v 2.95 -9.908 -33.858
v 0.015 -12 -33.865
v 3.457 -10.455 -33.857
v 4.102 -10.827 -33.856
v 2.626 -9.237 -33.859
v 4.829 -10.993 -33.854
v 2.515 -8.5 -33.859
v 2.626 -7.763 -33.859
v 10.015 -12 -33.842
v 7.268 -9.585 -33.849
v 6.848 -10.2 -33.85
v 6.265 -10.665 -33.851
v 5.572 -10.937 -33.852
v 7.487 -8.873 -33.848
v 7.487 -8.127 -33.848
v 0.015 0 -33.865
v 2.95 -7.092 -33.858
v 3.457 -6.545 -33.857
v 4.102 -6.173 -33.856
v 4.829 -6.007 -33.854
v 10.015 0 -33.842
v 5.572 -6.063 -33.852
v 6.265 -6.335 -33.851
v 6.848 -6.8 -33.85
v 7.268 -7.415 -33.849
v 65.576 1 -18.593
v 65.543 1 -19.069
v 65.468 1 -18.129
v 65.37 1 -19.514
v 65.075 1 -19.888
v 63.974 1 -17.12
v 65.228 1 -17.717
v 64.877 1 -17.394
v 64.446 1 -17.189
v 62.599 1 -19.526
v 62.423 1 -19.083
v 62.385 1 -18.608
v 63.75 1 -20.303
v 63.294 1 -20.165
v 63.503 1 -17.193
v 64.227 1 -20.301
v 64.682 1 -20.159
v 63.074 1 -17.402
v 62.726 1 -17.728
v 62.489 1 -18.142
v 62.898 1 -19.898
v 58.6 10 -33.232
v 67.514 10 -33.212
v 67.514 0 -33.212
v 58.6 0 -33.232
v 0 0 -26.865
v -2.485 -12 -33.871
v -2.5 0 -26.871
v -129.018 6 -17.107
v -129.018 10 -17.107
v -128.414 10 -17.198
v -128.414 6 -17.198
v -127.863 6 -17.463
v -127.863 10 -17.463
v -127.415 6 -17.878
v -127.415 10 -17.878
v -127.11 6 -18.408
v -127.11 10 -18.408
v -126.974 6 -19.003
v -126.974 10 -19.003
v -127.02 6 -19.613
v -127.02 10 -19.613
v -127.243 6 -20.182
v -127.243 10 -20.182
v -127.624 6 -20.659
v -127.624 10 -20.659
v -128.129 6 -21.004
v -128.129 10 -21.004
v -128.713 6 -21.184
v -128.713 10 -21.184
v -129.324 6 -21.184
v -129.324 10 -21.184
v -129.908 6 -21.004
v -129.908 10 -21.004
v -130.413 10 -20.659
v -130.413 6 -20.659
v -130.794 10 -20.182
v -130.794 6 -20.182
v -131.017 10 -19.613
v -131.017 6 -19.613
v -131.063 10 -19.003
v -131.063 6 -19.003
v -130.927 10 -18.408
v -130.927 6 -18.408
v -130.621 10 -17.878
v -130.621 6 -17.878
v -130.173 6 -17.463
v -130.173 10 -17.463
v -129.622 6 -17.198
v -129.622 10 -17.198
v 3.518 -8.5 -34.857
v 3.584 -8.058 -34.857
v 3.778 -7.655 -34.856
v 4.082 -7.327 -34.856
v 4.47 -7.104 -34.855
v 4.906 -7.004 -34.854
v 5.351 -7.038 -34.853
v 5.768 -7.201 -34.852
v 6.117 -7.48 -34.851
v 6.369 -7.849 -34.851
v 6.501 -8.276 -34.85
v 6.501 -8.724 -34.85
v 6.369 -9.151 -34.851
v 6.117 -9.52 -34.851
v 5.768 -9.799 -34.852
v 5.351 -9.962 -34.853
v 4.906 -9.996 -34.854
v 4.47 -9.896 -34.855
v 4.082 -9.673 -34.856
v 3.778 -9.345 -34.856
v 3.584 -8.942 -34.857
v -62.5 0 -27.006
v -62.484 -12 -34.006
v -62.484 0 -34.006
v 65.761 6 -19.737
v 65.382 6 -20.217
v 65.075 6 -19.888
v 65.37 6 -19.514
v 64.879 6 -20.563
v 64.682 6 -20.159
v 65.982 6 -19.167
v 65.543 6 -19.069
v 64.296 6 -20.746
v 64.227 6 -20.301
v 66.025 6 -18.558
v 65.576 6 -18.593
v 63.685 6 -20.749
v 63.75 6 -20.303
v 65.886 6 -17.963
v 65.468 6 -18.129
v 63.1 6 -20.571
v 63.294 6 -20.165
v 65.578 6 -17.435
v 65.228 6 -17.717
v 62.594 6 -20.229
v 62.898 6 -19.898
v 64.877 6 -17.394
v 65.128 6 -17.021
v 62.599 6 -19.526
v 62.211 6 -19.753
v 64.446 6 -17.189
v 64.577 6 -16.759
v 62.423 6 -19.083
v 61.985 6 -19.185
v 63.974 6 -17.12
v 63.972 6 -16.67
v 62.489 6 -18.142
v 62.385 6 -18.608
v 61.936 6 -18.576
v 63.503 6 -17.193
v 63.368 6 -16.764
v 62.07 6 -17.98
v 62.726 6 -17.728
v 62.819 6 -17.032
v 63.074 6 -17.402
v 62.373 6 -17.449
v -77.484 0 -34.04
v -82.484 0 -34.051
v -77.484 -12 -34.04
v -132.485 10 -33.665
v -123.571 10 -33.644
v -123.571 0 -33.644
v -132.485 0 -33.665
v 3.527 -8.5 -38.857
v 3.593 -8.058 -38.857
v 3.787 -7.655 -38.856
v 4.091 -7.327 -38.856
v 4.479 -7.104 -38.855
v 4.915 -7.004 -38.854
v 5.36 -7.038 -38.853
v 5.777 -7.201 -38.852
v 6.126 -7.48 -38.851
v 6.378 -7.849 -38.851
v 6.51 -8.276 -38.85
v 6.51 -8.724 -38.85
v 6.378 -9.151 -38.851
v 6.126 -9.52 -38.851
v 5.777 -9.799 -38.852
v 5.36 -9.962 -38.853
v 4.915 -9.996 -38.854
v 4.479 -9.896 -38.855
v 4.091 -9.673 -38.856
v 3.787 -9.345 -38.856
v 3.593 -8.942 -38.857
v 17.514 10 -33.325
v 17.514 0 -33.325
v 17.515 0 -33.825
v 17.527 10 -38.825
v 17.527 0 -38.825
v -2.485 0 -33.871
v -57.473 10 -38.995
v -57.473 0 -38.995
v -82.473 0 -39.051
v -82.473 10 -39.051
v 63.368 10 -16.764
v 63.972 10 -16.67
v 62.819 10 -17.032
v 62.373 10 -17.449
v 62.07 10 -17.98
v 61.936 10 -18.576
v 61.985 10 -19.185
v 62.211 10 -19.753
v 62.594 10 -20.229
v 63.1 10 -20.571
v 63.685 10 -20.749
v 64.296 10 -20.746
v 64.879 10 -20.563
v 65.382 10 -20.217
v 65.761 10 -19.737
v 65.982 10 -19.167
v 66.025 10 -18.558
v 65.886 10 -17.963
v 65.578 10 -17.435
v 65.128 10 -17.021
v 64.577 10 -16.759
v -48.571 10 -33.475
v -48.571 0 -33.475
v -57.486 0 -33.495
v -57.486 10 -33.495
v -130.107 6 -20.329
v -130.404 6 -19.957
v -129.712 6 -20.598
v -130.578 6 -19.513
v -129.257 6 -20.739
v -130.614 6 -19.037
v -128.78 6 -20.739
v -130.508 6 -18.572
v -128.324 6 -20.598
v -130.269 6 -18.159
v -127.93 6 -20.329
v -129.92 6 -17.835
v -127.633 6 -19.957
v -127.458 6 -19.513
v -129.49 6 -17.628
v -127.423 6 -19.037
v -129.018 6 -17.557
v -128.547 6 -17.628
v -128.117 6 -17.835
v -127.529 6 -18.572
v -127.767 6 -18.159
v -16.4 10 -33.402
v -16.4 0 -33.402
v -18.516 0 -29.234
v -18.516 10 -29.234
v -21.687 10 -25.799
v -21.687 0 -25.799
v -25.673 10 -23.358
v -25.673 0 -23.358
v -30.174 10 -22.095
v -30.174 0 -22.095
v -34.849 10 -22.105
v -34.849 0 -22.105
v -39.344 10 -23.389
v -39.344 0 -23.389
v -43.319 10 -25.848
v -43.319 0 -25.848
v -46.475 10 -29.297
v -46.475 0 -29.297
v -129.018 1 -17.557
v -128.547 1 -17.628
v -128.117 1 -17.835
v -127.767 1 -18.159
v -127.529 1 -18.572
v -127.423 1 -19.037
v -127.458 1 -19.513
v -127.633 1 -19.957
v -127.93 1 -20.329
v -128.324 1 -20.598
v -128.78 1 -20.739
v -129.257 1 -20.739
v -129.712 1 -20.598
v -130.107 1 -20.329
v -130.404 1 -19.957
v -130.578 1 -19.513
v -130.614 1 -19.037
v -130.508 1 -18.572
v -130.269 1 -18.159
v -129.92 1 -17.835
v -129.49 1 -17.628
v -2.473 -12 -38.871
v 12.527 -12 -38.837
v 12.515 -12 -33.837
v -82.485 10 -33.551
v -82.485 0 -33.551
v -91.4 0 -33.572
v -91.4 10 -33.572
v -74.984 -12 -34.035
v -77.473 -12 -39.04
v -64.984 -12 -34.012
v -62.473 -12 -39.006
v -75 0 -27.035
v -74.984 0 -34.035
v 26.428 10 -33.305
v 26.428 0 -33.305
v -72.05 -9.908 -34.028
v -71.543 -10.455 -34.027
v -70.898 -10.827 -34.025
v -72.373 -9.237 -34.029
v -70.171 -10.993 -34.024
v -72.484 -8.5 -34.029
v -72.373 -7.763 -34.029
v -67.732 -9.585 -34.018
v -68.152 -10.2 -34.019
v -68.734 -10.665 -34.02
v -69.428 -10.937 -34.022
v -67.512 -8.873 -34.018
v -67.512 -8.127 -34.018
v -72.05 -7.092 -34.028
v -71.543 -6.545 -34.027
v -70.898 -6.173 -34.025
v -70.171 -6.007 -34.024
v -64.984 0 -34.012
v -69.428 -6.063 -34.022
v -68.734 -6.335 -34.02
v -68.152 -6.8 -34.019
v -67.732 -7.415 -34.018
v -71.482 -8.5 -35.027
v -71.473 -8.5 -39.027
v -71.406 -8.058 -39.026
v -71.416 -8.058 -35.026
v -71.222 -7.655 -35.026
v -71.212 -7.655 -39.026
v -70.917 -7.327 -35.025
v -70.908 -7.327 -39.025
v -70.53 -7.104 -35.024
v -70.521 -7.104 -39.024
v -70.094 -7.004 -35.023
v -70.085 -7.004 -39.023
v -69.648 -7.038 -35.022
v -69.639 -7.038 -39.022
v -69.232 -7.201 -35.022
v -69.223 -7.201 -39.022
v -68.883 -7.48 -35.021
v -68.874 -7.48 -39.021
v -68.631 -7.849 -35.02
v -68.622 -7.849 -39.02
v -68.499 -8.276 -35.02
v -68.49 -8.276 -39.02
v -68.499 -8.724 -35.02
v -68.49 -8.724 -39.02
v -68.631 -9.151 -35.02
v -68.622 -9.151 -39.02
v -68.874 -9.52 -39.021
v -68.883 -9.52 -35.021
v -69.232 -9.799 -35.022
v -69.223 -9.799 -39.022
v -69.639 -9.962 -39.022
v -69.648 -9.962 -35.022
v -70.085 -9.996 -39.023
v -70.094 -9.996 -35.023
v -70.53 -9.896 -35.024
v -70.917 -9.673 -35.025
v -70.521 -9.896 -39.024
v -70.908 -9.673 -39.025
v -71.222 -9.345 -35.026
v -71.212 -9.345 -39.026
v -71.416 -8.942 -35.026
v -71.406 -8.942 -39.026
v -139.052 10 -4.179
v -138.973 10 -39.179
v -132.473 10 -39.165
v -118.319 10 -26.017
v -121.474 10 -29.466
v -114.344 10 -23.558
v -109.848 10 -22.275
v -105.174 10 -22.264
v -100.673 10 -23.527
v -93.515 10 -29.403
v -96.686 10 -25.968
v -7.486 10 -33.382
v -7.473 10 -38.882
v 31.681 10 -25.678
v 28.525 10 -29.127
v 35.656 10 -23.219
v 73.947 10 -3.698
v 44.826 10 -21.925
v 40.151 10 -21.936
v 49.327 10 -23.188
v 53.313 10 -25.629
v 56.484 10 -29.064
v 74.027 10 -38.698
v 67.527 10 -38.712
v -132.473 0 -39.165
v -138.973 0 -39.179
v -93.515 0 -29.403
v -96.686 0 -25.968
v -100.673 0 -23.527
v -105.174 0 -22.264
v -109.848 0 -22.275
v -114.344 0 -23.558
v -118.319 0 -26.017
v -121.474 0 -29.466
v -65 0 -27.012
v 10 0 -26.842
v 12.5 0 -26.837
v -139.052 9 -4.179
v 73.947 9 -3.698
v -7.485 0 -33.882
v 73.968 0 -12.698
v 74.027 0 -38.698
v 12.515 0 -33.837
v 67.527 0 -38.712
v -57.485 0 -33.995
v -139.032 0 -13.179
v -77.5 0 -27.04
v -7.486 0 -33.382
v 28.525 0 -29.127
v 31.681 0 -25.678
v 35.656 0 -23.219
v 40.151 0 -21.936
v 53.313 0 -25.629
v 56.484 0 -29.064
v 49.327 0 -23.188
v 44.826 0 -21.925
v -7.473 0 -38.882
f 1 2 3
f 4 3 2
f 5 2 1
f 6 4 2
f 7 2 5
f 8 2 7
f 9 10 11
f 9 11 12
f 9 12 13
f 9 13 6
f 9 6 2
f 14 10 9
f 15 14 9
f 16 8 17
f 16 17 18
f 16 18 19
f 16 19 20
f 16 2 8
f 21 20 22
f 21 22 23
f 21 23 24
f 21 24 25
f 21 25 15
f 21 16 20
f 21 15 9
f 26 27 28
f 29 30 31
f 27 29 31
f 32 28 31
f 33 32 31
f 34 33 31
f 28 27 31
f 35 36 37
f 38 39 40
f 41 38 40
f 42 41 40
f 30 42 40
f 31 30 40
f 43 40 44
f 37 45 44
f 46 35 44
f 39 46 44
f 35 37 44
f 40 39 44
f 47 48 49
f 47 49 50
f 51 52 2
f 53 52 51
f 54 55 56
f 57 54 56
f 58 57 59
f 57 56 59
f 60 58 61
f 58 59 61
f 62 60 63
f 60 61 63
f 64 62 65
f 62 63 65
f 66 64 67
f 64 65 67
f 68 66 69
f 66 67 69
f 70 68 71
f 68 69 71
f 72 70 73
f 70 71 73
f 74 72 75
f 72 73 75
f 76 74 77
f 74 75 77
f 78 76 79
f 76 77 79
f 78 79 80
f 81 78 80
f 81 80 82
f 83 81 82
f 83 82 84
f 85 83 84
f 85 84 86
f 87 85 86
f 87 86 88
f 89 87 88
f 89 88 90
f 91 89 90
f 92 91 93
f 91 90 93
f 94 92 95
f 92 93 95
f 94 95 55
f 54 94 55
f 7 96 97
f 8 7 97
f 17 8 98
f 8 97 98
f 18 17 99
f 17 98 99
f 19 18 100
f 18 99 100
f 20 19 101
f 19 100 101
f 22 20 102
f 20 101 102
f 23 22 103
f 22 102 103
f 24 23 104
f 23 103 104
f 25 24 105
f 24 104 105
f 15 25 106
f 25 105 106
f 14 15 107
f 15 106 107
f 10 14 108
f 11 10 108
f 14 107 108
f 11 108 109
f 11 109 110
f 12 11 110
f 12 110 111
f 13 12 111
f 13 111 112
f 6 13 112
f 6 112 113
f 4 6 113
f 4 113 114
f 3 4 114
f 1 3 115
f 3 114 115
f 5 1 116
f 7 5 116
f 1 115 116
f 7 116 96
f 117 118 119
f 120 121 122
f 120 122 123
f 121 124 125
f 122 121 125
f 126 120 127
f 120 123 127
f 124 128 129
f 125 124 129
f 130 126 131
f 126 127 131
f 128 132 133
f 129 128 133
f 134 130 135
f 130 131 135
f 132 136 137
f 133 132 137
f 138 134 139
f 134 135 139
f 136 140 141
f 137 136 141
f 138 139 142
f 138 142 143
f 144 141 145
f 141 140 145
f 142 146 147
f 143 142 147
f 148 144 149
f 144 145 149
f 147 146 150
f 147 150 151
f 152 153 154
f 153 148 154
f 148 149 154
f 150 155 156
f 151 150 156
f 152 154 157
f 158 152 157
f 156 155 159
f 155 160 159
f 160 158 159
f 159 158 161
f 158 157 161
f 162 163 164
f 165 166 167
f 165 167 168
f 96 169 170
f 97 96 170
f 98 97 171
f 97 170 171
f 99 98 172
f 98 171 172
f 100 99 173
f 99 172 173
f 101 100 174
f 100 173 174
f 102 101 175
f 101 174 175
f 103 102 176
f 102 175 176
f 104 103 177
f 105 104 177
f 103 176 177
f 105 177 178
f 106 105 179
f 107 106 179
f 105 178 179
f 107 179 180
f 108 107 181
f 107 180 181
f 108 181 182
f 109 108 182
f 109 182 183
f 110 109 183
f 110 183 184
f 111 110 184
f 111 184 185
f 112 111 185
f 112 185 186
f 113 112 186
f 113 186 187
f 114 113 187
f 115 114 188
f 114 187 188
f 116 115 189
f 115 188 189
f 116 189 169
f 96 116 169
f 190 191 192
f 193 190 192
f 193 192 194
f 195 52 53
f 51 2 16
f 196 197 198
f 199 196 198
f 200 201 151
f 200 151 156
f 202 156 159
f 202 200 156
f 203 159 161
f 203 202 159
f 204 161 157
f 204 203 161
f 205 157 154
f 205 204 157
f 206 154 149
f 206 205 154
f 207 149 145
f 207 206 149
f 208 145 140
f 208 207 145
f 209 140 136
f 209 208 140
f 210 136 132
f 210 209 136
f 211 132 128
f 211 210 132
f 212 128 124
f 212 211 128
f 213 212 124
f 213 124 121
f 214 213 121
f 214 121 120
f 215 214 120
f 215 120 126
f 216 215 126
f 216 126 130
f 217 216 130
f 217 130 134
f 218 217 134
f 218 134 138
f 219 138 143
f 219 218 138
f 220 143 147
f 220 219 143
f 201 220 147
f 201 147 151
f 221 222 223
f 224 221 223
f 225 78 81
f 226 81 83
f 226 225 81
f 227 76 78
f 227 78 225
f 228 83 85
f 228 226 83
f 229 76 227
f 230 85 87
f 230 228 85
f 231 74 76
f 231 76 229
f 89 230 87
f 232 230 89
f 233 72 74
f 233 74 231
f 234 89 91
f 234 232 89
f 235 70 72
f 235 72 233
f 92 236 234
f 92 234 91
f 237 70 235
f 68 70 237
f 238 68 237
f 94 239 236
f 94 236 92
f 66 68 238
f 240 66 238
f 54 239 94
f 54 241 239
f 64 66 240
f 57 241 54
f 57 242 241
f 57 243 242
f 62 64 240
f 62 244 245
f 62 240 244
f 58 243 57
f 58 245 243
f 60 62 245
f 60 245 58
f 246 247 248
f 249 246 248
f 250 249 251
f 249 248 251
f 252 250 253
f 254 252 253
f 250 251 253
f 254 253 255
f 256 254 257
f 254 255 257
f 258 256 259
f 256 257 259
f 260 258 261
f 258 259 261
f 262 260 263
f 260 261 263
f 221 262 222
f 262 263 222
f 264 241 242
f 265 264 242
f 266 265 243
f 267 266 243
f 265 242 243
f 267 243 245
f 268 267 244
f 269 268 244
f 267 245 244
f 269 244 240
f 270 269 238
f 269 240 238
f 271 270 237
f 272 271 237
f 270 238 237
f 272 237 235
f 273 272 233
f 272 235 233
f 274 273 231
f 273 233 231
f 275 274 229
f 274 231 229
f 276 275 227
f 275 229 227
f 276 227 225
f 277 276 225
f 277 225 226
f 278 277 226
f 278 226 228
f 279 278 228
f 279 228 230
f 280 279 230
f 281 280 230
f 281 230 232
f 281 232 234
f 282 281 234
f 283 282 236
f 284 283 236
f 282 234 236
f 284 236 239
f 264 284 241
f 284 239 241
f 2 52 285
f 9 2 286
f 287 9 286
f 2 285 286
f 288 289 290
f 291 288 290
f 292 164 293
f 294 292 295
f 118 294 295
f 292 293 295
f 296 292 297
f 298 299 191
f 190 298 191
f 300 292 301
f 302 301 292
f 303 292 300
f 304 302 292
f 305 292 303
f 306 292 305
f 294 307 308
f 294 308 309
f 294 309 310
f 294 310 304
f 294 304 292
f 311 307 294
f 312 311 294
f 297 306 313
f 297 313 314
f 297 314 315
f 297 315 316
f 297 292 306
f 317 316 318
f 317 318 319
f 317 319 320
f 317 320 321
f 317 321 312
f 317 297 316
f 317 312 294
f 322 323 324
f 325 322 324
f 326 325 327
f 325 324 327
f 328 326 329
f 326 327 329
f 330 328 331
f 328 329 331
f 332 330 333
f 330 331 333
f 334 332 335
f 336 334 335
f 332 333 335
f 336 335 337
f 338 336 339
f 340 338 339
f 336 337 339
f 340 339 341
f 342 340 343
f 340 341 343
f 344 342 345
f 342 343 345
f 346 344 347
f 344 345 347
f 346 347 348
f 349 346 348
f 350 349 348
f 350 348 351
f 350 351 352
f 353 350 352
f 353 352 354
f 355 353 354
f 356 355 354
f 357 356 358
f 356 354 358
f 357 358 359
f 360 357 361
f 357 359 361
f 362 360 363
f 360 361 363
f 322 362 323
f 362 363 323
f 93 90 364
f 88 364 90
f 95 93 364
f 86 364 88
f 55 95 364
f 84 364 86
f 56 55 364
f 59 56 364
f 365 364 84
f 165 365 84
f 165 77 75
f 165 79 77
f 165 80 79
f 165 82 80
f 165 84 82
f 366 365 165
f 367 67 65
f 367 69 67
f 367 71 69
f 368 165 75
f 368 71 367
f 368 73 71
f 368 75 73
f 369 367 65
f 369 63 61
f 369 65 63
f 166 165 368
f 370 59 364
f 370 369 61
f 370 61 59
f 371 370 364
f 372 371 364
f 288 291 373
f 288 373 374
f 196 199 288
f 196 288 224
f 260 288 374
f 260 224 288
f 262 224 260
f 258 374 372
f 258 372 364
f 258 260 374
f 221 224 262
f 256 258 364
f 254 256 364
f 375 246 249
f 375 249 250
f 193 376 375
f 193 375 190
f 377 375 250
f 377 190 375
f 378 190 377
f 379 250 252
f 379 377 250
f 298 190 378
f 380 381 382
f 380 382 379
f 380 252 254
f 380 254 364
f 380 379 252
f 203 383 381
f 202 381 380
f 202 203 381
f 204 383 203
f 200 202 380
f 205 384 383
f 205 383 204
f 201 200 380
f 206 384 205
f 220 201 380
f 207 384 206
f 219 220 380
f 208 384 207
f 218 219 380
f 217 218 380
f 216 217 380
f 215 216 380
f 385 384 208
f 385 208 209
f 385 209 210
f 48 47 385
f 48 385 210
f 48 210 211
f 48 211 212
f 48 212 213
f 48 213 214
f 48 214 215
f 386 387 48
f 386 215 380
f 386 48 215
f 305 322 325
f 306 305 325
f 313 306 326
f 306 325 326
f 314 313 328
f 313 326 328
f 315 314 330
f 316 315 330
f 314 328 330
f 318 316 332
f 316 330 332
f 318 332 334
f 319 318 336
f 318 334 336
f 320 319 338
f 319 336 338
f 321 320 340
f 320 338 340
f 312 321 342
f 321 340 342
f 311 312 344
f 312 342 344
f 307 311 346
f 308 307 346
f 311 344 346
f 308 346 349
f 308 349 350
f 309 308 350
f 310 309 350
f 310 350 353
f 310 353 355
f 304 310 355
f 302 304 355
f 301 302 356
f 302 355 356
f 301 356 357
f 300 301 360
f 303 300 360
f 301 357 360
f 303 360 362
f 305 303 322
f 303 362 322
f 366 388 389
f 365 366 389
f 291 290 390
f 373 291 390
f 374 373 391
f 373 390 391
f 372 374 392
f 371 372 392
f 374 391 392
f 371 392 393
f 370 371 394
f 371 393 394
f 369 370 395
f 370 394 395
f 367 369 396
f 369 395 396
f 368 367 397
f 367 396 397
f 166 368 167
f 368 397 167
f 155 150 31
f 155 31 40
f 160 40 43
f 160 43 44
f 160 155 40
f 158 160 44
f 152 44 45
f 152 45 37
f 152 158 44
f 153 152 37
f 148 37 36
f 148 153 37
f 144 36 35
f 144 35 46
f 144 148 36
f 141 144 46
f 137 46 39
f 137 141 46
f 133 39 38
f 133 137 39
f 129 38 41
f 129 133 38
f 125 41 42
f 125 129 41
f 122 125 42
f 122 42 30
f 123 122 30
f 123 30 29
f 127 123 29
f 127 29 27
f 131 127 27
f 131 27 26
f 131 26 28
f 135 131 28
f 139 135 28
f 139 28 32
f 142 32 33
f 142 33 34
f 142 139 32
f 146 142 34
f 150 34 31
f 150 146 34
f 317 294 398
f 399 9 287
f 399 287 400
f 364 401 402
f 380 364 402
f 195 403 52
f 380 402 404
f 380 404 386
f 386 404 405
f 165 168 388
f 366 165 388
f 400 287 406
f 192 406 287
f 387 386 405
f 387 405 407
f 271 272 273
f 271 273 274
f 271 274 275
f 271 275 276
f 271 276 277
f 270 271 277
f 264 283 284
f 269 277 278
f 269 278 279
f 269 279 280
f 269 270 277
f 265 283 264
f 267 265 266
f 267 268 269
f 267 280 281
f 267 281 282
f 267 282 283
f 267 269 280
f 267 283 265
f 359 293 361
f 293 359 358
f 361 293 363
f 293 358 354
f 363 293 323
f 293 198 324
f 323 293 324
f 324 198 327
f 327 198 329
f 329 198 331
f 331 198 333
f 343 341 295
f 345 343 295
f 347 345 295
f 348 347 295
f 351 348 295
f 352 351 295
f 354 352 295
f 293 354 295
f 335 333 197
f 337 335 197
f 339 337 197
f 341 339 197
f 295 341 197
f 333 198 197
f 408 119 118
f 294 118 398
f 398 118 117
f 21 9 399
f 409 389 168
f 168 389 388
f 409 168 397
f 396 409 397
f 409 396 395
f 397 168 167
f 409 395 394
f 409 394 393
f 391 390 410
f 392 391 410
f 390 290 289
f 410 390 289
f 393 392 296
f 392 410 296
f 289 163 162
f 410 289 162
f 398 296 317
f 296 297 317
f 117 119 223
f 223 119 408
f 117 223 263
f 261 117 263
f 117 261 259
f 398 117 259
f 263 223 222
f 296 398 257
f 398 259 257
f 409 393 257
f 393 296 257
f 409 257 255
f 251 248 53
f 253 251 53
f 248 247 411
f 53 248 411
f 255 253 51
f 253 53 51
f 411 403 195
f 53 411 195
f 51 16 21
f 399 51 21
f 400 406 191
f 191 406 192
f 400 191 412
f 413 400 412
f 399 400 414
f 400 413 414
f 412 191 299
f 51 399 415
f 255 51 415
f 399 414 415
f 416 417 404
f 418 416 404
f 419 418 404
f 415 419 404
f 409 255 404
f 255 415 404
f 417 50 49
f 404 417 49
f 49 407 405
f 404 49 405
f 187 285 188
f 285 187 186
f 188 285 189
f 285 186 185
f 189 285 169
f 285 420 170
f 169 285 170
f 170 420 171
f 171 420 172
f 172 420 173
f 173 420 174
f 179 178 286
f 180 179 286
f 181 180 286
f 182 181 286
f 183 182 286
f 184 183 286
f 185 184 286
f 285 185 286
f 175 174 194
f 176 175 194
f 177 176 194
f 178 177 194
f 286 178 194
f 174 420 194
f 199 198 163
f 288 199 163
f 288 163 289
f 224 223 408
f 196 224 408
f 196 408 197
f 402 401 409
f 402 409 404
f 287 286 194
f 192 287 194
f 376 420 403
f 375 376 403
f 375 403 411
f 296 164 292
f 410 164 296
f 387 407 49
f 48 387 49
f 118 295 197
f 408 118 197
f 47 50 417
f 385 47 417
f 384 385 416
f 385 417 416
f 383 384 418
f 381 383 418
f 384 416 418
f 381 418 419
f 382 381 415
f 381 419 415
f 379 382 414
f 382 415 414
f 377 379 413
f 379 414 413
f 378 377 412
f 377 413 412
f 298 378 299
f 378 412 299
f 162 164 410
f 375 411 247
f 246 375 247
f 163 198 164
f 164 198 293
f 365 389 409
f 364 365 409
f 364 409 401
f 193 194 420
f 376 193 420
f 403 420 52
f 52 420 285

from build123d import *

# Parameters (mm, degrees)
BOSS_EXTRUDE3_DEPTH        = 10
SKETCH4_R                  = 1.5
BOSS_EXTRUDE4_DEPTH        = 5
RIB6_REACH                 = 158.985
SKETCH5_WALL_W             = 329.861950248
SKETCH5_WALL_H             = 2.5
CHAMFER2_SIZE              = 1
LPATTERN4_COUNT            = 2
LPATTERN4_PITCH            = 75
LPATTERN4_COPY_1_REACH     = 158.985
LPATTERN4_COPY_1_SKETCH_W  = 329.861950248
LPATTERN4_COPY_1_SKETCH_H  = 2.5
CHAMFER2_OF_LPATTERN4_SIZE = 1
CHAMFER3_SIZE              = 9
SKETCH8_R                  = 2.05
CUT_EXTRUDE1_DEPTH         = 4
SKETCH9_R                  = 1.6
CUT_EXTRUDE2_DEPTH         = 5


with BuildPart() as part:
    # Sketch2 → Boss-Extrude3 (new body)
    with BuildSketch(Plane(origin=(0, 0, 0), x_dir=(1, 0, 0), z_dir=(0, 1, 0))):
        with BuildLine():
            Line((-138.973021921, 39.179223473), (-139.052157616, 4.179312937))
            Line((-139.052157616, 4.179312937), (73.947297933, 3.697715709))
            Line((73.947297933, 3.697715709), (74.026978079, 38.697625014))
            Line((74.026978079, 38.697625014), (67.526578048, 38.712322585))
            Line((67.526578048, 38.712322585), (67.51414235, 33.212297518))
            Line((67.51414235, 33.212297518), (58.599731895, 33.232453229))
            ThreePointArc((58.599731895, 33.232453229), (42.488076808, 21.768891824), (26.428425, 33.305193378))
            Line((26.428425, 33.305193378), (17.51414235, 33.3253488))
            Line((17.51414235, 33.3253488), (17.526578048, 38.825373866))
            Line((17.526578048, 38.825373866), (-7.473230244, 38.881899074))
            Line((-7.473230244, 38.881899074), (-7.485665941, 33.381874007))
            Line((-7.485665941, 33.381874007), (-16.400076396, 33.402029717))
            ThreePointArc((-16.400076396, 33.402029717), (-32.511731484, 21.938468313), (-48.571383292, 33.474769867))
            Line((-48.571383292, 33.474769867), (-57.485665941, 33.494925288))
            Line((-57.485665941, 33.494925288), (-57.473230244, 38.994950355))
            Line((-57.473230244, 38.994950355), (-82.473038536, 39.051475562))
            Line((-82.473038536, 39.051475562), (-82.485474233, 33.551450496))
            Line((-82.485474233, 33.551450496), (-91.399884688, 33.571606206))
            ThreePointArc((-91.399884688, 33.571606206), (-107.511539776, 22.108044802), (-123.571191584, 33.644346356))
            Line((-123.571191584, 33.644346356), (-132.485474233, 33.664501777))
            Line((-132.485474233, 33.664501777), (-132.473038536, 39.164526844))
            Line((-132.473038536, 39.164526844), (-138.973021921, 39.179223473))
        make_face()
    extrude(amount=BOSS_EXTRUDE3_DEPTH)

    # Sketch4 → Boss-Extrude4 (add)
    with BuildSketch(Plane(origin=(0.087874316, 0, -38.864803222), x_dir=(-0.99999744389135, 0, -0.002261019850970016), z_dir=(0.002261019850970016, 0, -0.99999744389135))):
        Polygon((62.56118779, -12), (57.561251693, 0), (82.561123887, 0), (77.56118779, -12), align=None)
        with Locations((70.06118779, -8.5)):
            Circle(SKETCH4_R, mode=Mode.SUBTRACT)
    boss_extrude4 = extrude(amount=-BOSS_EXTRUDE4_DEPTH)

    # Sketch5 wall → Rib6 (add, up to next)
    with BuildSketch(Plane(origin=(-77.492333887, -6, -30.540192335), x_dir=(-0.001139262394, 0.863778900906, 0.503869737562), z_dir=(-0.001953021242, -0.503871025511, 0.863776692993)), mode=Mode.PRIVATE) as rib6_sk1:
        with Locations((0, -1.25)):
            Rectangle(SKETCH5_WALL_W, SKETCH5_WALL_H)
    rib6_tool1 = extrude(rib6_sk1.sketch, amount=-RIB6_REACH, mode=Mode.PRIVATE) - part.part
    rib6 = rib6_tool1.solids().sort_by_distance((-77.492333887, -6, -30.540192335))[0]
    add(rib6)

    # Mirror2: Rib6 across plane
    add(rib6.mirror(Plane(origin=(-70.061008706, 0, -0.158409736), x_dir=(-0.0022610198509701073, 0, 0.99999744389135), z_dir=(0.99999744389135, 0, 0.002261019850970107))))

    # Chamfer2
    chamfer2_edges = [part.edges().sort_by_distance(p)[0] for p in [
        (-68.484443323, -8.5, -34.01983421),
    ]]
    chamfer(chamfer2_edges, length=CHAMFER2_SIZE)

    # LPattern4: Boss-Extrude4, Rib6 ×2
    with Locations(*[Vector(0.9999974438913499, 0, 0.002261019850970079) * (i * LPATTERN4_PITCH) for i in range(1, LPATTERN4_COUNT)]):
        add(boss_extrude4)
        add(rib6)

    # LPattern4 copy 1 sketch → LPattern4 copy 1 (add, up to next)
    with BuildSketch(Plane(origin=(12.507436062, -6, -30.336700548), x_dir=(-0.0011392623880184954, 0.863778900906, 0.5038697375620136), z_dir=(-0.0019530212415939509, -0.503871025511, 0.863776692993001)), mode=Mode.PRIVATE) as lpattern4_copy_1_sk1:
        with Locations((0, 1.25)):
            Rectangle(LPATTERN4_COPY_1_SKETCH_W, LPATTERN4_COPY_1_SKETCH_H)
    lpattern4_copy_1_tool1 = extrude(lpattern4_copy_1_sk1.sketch, amount=-LPATTERN4_COPY_1_REACH, mode=Mode.PRIVATE) - part.part
    add(lpattern4_copy_1_tool1.solids().sort_by_distance((12.507436062, -6, -30.336700548))[0])

    # Chamfer2 of LPattern4
    chamfer2_of_lpattern4_edges = [part.edges().sort_by_distance(p)[0] for p in [
        (6.515364969, -8.5, -33.850257721),
    ]]
    chamfer(chamfer2_of_lpattern4_edges, length=CHAMFER2_OF_LPATTERN4_SIZE)

    # Chamfer3
    chamfer3_edges = [part.edges().sort_by_distance(p)[0] for p in [
        (-32.552429841, 0, -3.938514323),
    ]]
    chamfer(chamfer3_edges, length=CHAMFER3_SIZE)

    # Sketch8 → Cut-Extrude1 (cut)
    with BuildSketch(Plane(origin=(0, 10, 0), x_dir=(1, 0, 0), z_dir=(0, 1, 0))):
        with Locations(Location((-129.018242433, 19.156613217, 0), (0, 0, 270))):
            Circle(SKETCH8_R)
    cut_extrude1 = extrude(amount=-CUT_EXTRUDE1_DEPTH, mode=Mode.SUBTRACT)

    # Sketch9 → Cut-Extrude2 (cut)
    with BuildSketch(Plane(origin=(0, 6, 0), x_dir=(1, 0, 0), z_dir=(0, 1, 0))):
        with Locations(Location((-129.018242433, 19.156613217, 0), (0, 0, 270))):
            Circle(SKETCH9_R)
    cut_extrude2 = extrude(amount=-CUT_EXTRUDE2_DEPTH, mode=Mode.SUBTRACT)

    # Mirror4: Cut-Extrude1, Cut-Extrude2 across plane
    add(cut_extrude1.mirror(Plane(origin=(-32.561168463, 0, -0.073621636), x_dir=(-0.002261019850969509, 0, 0.99999744389135), z_dir=(-0.99999744389135, 0, -0.0022610198509695084))), mode=Mode.SUBTRACT)
    add(cut_extrude2.mirror(Plane(origin=(-32.561168463, 0, -0.073621636), x_dir=(-0.002261019850969509, 0, 0.99999744389135), z_dir=(-0.99999744389135, 0, -0.0022610198509695084))), mode=Mode.SUBTRACT)


solid = part.part
